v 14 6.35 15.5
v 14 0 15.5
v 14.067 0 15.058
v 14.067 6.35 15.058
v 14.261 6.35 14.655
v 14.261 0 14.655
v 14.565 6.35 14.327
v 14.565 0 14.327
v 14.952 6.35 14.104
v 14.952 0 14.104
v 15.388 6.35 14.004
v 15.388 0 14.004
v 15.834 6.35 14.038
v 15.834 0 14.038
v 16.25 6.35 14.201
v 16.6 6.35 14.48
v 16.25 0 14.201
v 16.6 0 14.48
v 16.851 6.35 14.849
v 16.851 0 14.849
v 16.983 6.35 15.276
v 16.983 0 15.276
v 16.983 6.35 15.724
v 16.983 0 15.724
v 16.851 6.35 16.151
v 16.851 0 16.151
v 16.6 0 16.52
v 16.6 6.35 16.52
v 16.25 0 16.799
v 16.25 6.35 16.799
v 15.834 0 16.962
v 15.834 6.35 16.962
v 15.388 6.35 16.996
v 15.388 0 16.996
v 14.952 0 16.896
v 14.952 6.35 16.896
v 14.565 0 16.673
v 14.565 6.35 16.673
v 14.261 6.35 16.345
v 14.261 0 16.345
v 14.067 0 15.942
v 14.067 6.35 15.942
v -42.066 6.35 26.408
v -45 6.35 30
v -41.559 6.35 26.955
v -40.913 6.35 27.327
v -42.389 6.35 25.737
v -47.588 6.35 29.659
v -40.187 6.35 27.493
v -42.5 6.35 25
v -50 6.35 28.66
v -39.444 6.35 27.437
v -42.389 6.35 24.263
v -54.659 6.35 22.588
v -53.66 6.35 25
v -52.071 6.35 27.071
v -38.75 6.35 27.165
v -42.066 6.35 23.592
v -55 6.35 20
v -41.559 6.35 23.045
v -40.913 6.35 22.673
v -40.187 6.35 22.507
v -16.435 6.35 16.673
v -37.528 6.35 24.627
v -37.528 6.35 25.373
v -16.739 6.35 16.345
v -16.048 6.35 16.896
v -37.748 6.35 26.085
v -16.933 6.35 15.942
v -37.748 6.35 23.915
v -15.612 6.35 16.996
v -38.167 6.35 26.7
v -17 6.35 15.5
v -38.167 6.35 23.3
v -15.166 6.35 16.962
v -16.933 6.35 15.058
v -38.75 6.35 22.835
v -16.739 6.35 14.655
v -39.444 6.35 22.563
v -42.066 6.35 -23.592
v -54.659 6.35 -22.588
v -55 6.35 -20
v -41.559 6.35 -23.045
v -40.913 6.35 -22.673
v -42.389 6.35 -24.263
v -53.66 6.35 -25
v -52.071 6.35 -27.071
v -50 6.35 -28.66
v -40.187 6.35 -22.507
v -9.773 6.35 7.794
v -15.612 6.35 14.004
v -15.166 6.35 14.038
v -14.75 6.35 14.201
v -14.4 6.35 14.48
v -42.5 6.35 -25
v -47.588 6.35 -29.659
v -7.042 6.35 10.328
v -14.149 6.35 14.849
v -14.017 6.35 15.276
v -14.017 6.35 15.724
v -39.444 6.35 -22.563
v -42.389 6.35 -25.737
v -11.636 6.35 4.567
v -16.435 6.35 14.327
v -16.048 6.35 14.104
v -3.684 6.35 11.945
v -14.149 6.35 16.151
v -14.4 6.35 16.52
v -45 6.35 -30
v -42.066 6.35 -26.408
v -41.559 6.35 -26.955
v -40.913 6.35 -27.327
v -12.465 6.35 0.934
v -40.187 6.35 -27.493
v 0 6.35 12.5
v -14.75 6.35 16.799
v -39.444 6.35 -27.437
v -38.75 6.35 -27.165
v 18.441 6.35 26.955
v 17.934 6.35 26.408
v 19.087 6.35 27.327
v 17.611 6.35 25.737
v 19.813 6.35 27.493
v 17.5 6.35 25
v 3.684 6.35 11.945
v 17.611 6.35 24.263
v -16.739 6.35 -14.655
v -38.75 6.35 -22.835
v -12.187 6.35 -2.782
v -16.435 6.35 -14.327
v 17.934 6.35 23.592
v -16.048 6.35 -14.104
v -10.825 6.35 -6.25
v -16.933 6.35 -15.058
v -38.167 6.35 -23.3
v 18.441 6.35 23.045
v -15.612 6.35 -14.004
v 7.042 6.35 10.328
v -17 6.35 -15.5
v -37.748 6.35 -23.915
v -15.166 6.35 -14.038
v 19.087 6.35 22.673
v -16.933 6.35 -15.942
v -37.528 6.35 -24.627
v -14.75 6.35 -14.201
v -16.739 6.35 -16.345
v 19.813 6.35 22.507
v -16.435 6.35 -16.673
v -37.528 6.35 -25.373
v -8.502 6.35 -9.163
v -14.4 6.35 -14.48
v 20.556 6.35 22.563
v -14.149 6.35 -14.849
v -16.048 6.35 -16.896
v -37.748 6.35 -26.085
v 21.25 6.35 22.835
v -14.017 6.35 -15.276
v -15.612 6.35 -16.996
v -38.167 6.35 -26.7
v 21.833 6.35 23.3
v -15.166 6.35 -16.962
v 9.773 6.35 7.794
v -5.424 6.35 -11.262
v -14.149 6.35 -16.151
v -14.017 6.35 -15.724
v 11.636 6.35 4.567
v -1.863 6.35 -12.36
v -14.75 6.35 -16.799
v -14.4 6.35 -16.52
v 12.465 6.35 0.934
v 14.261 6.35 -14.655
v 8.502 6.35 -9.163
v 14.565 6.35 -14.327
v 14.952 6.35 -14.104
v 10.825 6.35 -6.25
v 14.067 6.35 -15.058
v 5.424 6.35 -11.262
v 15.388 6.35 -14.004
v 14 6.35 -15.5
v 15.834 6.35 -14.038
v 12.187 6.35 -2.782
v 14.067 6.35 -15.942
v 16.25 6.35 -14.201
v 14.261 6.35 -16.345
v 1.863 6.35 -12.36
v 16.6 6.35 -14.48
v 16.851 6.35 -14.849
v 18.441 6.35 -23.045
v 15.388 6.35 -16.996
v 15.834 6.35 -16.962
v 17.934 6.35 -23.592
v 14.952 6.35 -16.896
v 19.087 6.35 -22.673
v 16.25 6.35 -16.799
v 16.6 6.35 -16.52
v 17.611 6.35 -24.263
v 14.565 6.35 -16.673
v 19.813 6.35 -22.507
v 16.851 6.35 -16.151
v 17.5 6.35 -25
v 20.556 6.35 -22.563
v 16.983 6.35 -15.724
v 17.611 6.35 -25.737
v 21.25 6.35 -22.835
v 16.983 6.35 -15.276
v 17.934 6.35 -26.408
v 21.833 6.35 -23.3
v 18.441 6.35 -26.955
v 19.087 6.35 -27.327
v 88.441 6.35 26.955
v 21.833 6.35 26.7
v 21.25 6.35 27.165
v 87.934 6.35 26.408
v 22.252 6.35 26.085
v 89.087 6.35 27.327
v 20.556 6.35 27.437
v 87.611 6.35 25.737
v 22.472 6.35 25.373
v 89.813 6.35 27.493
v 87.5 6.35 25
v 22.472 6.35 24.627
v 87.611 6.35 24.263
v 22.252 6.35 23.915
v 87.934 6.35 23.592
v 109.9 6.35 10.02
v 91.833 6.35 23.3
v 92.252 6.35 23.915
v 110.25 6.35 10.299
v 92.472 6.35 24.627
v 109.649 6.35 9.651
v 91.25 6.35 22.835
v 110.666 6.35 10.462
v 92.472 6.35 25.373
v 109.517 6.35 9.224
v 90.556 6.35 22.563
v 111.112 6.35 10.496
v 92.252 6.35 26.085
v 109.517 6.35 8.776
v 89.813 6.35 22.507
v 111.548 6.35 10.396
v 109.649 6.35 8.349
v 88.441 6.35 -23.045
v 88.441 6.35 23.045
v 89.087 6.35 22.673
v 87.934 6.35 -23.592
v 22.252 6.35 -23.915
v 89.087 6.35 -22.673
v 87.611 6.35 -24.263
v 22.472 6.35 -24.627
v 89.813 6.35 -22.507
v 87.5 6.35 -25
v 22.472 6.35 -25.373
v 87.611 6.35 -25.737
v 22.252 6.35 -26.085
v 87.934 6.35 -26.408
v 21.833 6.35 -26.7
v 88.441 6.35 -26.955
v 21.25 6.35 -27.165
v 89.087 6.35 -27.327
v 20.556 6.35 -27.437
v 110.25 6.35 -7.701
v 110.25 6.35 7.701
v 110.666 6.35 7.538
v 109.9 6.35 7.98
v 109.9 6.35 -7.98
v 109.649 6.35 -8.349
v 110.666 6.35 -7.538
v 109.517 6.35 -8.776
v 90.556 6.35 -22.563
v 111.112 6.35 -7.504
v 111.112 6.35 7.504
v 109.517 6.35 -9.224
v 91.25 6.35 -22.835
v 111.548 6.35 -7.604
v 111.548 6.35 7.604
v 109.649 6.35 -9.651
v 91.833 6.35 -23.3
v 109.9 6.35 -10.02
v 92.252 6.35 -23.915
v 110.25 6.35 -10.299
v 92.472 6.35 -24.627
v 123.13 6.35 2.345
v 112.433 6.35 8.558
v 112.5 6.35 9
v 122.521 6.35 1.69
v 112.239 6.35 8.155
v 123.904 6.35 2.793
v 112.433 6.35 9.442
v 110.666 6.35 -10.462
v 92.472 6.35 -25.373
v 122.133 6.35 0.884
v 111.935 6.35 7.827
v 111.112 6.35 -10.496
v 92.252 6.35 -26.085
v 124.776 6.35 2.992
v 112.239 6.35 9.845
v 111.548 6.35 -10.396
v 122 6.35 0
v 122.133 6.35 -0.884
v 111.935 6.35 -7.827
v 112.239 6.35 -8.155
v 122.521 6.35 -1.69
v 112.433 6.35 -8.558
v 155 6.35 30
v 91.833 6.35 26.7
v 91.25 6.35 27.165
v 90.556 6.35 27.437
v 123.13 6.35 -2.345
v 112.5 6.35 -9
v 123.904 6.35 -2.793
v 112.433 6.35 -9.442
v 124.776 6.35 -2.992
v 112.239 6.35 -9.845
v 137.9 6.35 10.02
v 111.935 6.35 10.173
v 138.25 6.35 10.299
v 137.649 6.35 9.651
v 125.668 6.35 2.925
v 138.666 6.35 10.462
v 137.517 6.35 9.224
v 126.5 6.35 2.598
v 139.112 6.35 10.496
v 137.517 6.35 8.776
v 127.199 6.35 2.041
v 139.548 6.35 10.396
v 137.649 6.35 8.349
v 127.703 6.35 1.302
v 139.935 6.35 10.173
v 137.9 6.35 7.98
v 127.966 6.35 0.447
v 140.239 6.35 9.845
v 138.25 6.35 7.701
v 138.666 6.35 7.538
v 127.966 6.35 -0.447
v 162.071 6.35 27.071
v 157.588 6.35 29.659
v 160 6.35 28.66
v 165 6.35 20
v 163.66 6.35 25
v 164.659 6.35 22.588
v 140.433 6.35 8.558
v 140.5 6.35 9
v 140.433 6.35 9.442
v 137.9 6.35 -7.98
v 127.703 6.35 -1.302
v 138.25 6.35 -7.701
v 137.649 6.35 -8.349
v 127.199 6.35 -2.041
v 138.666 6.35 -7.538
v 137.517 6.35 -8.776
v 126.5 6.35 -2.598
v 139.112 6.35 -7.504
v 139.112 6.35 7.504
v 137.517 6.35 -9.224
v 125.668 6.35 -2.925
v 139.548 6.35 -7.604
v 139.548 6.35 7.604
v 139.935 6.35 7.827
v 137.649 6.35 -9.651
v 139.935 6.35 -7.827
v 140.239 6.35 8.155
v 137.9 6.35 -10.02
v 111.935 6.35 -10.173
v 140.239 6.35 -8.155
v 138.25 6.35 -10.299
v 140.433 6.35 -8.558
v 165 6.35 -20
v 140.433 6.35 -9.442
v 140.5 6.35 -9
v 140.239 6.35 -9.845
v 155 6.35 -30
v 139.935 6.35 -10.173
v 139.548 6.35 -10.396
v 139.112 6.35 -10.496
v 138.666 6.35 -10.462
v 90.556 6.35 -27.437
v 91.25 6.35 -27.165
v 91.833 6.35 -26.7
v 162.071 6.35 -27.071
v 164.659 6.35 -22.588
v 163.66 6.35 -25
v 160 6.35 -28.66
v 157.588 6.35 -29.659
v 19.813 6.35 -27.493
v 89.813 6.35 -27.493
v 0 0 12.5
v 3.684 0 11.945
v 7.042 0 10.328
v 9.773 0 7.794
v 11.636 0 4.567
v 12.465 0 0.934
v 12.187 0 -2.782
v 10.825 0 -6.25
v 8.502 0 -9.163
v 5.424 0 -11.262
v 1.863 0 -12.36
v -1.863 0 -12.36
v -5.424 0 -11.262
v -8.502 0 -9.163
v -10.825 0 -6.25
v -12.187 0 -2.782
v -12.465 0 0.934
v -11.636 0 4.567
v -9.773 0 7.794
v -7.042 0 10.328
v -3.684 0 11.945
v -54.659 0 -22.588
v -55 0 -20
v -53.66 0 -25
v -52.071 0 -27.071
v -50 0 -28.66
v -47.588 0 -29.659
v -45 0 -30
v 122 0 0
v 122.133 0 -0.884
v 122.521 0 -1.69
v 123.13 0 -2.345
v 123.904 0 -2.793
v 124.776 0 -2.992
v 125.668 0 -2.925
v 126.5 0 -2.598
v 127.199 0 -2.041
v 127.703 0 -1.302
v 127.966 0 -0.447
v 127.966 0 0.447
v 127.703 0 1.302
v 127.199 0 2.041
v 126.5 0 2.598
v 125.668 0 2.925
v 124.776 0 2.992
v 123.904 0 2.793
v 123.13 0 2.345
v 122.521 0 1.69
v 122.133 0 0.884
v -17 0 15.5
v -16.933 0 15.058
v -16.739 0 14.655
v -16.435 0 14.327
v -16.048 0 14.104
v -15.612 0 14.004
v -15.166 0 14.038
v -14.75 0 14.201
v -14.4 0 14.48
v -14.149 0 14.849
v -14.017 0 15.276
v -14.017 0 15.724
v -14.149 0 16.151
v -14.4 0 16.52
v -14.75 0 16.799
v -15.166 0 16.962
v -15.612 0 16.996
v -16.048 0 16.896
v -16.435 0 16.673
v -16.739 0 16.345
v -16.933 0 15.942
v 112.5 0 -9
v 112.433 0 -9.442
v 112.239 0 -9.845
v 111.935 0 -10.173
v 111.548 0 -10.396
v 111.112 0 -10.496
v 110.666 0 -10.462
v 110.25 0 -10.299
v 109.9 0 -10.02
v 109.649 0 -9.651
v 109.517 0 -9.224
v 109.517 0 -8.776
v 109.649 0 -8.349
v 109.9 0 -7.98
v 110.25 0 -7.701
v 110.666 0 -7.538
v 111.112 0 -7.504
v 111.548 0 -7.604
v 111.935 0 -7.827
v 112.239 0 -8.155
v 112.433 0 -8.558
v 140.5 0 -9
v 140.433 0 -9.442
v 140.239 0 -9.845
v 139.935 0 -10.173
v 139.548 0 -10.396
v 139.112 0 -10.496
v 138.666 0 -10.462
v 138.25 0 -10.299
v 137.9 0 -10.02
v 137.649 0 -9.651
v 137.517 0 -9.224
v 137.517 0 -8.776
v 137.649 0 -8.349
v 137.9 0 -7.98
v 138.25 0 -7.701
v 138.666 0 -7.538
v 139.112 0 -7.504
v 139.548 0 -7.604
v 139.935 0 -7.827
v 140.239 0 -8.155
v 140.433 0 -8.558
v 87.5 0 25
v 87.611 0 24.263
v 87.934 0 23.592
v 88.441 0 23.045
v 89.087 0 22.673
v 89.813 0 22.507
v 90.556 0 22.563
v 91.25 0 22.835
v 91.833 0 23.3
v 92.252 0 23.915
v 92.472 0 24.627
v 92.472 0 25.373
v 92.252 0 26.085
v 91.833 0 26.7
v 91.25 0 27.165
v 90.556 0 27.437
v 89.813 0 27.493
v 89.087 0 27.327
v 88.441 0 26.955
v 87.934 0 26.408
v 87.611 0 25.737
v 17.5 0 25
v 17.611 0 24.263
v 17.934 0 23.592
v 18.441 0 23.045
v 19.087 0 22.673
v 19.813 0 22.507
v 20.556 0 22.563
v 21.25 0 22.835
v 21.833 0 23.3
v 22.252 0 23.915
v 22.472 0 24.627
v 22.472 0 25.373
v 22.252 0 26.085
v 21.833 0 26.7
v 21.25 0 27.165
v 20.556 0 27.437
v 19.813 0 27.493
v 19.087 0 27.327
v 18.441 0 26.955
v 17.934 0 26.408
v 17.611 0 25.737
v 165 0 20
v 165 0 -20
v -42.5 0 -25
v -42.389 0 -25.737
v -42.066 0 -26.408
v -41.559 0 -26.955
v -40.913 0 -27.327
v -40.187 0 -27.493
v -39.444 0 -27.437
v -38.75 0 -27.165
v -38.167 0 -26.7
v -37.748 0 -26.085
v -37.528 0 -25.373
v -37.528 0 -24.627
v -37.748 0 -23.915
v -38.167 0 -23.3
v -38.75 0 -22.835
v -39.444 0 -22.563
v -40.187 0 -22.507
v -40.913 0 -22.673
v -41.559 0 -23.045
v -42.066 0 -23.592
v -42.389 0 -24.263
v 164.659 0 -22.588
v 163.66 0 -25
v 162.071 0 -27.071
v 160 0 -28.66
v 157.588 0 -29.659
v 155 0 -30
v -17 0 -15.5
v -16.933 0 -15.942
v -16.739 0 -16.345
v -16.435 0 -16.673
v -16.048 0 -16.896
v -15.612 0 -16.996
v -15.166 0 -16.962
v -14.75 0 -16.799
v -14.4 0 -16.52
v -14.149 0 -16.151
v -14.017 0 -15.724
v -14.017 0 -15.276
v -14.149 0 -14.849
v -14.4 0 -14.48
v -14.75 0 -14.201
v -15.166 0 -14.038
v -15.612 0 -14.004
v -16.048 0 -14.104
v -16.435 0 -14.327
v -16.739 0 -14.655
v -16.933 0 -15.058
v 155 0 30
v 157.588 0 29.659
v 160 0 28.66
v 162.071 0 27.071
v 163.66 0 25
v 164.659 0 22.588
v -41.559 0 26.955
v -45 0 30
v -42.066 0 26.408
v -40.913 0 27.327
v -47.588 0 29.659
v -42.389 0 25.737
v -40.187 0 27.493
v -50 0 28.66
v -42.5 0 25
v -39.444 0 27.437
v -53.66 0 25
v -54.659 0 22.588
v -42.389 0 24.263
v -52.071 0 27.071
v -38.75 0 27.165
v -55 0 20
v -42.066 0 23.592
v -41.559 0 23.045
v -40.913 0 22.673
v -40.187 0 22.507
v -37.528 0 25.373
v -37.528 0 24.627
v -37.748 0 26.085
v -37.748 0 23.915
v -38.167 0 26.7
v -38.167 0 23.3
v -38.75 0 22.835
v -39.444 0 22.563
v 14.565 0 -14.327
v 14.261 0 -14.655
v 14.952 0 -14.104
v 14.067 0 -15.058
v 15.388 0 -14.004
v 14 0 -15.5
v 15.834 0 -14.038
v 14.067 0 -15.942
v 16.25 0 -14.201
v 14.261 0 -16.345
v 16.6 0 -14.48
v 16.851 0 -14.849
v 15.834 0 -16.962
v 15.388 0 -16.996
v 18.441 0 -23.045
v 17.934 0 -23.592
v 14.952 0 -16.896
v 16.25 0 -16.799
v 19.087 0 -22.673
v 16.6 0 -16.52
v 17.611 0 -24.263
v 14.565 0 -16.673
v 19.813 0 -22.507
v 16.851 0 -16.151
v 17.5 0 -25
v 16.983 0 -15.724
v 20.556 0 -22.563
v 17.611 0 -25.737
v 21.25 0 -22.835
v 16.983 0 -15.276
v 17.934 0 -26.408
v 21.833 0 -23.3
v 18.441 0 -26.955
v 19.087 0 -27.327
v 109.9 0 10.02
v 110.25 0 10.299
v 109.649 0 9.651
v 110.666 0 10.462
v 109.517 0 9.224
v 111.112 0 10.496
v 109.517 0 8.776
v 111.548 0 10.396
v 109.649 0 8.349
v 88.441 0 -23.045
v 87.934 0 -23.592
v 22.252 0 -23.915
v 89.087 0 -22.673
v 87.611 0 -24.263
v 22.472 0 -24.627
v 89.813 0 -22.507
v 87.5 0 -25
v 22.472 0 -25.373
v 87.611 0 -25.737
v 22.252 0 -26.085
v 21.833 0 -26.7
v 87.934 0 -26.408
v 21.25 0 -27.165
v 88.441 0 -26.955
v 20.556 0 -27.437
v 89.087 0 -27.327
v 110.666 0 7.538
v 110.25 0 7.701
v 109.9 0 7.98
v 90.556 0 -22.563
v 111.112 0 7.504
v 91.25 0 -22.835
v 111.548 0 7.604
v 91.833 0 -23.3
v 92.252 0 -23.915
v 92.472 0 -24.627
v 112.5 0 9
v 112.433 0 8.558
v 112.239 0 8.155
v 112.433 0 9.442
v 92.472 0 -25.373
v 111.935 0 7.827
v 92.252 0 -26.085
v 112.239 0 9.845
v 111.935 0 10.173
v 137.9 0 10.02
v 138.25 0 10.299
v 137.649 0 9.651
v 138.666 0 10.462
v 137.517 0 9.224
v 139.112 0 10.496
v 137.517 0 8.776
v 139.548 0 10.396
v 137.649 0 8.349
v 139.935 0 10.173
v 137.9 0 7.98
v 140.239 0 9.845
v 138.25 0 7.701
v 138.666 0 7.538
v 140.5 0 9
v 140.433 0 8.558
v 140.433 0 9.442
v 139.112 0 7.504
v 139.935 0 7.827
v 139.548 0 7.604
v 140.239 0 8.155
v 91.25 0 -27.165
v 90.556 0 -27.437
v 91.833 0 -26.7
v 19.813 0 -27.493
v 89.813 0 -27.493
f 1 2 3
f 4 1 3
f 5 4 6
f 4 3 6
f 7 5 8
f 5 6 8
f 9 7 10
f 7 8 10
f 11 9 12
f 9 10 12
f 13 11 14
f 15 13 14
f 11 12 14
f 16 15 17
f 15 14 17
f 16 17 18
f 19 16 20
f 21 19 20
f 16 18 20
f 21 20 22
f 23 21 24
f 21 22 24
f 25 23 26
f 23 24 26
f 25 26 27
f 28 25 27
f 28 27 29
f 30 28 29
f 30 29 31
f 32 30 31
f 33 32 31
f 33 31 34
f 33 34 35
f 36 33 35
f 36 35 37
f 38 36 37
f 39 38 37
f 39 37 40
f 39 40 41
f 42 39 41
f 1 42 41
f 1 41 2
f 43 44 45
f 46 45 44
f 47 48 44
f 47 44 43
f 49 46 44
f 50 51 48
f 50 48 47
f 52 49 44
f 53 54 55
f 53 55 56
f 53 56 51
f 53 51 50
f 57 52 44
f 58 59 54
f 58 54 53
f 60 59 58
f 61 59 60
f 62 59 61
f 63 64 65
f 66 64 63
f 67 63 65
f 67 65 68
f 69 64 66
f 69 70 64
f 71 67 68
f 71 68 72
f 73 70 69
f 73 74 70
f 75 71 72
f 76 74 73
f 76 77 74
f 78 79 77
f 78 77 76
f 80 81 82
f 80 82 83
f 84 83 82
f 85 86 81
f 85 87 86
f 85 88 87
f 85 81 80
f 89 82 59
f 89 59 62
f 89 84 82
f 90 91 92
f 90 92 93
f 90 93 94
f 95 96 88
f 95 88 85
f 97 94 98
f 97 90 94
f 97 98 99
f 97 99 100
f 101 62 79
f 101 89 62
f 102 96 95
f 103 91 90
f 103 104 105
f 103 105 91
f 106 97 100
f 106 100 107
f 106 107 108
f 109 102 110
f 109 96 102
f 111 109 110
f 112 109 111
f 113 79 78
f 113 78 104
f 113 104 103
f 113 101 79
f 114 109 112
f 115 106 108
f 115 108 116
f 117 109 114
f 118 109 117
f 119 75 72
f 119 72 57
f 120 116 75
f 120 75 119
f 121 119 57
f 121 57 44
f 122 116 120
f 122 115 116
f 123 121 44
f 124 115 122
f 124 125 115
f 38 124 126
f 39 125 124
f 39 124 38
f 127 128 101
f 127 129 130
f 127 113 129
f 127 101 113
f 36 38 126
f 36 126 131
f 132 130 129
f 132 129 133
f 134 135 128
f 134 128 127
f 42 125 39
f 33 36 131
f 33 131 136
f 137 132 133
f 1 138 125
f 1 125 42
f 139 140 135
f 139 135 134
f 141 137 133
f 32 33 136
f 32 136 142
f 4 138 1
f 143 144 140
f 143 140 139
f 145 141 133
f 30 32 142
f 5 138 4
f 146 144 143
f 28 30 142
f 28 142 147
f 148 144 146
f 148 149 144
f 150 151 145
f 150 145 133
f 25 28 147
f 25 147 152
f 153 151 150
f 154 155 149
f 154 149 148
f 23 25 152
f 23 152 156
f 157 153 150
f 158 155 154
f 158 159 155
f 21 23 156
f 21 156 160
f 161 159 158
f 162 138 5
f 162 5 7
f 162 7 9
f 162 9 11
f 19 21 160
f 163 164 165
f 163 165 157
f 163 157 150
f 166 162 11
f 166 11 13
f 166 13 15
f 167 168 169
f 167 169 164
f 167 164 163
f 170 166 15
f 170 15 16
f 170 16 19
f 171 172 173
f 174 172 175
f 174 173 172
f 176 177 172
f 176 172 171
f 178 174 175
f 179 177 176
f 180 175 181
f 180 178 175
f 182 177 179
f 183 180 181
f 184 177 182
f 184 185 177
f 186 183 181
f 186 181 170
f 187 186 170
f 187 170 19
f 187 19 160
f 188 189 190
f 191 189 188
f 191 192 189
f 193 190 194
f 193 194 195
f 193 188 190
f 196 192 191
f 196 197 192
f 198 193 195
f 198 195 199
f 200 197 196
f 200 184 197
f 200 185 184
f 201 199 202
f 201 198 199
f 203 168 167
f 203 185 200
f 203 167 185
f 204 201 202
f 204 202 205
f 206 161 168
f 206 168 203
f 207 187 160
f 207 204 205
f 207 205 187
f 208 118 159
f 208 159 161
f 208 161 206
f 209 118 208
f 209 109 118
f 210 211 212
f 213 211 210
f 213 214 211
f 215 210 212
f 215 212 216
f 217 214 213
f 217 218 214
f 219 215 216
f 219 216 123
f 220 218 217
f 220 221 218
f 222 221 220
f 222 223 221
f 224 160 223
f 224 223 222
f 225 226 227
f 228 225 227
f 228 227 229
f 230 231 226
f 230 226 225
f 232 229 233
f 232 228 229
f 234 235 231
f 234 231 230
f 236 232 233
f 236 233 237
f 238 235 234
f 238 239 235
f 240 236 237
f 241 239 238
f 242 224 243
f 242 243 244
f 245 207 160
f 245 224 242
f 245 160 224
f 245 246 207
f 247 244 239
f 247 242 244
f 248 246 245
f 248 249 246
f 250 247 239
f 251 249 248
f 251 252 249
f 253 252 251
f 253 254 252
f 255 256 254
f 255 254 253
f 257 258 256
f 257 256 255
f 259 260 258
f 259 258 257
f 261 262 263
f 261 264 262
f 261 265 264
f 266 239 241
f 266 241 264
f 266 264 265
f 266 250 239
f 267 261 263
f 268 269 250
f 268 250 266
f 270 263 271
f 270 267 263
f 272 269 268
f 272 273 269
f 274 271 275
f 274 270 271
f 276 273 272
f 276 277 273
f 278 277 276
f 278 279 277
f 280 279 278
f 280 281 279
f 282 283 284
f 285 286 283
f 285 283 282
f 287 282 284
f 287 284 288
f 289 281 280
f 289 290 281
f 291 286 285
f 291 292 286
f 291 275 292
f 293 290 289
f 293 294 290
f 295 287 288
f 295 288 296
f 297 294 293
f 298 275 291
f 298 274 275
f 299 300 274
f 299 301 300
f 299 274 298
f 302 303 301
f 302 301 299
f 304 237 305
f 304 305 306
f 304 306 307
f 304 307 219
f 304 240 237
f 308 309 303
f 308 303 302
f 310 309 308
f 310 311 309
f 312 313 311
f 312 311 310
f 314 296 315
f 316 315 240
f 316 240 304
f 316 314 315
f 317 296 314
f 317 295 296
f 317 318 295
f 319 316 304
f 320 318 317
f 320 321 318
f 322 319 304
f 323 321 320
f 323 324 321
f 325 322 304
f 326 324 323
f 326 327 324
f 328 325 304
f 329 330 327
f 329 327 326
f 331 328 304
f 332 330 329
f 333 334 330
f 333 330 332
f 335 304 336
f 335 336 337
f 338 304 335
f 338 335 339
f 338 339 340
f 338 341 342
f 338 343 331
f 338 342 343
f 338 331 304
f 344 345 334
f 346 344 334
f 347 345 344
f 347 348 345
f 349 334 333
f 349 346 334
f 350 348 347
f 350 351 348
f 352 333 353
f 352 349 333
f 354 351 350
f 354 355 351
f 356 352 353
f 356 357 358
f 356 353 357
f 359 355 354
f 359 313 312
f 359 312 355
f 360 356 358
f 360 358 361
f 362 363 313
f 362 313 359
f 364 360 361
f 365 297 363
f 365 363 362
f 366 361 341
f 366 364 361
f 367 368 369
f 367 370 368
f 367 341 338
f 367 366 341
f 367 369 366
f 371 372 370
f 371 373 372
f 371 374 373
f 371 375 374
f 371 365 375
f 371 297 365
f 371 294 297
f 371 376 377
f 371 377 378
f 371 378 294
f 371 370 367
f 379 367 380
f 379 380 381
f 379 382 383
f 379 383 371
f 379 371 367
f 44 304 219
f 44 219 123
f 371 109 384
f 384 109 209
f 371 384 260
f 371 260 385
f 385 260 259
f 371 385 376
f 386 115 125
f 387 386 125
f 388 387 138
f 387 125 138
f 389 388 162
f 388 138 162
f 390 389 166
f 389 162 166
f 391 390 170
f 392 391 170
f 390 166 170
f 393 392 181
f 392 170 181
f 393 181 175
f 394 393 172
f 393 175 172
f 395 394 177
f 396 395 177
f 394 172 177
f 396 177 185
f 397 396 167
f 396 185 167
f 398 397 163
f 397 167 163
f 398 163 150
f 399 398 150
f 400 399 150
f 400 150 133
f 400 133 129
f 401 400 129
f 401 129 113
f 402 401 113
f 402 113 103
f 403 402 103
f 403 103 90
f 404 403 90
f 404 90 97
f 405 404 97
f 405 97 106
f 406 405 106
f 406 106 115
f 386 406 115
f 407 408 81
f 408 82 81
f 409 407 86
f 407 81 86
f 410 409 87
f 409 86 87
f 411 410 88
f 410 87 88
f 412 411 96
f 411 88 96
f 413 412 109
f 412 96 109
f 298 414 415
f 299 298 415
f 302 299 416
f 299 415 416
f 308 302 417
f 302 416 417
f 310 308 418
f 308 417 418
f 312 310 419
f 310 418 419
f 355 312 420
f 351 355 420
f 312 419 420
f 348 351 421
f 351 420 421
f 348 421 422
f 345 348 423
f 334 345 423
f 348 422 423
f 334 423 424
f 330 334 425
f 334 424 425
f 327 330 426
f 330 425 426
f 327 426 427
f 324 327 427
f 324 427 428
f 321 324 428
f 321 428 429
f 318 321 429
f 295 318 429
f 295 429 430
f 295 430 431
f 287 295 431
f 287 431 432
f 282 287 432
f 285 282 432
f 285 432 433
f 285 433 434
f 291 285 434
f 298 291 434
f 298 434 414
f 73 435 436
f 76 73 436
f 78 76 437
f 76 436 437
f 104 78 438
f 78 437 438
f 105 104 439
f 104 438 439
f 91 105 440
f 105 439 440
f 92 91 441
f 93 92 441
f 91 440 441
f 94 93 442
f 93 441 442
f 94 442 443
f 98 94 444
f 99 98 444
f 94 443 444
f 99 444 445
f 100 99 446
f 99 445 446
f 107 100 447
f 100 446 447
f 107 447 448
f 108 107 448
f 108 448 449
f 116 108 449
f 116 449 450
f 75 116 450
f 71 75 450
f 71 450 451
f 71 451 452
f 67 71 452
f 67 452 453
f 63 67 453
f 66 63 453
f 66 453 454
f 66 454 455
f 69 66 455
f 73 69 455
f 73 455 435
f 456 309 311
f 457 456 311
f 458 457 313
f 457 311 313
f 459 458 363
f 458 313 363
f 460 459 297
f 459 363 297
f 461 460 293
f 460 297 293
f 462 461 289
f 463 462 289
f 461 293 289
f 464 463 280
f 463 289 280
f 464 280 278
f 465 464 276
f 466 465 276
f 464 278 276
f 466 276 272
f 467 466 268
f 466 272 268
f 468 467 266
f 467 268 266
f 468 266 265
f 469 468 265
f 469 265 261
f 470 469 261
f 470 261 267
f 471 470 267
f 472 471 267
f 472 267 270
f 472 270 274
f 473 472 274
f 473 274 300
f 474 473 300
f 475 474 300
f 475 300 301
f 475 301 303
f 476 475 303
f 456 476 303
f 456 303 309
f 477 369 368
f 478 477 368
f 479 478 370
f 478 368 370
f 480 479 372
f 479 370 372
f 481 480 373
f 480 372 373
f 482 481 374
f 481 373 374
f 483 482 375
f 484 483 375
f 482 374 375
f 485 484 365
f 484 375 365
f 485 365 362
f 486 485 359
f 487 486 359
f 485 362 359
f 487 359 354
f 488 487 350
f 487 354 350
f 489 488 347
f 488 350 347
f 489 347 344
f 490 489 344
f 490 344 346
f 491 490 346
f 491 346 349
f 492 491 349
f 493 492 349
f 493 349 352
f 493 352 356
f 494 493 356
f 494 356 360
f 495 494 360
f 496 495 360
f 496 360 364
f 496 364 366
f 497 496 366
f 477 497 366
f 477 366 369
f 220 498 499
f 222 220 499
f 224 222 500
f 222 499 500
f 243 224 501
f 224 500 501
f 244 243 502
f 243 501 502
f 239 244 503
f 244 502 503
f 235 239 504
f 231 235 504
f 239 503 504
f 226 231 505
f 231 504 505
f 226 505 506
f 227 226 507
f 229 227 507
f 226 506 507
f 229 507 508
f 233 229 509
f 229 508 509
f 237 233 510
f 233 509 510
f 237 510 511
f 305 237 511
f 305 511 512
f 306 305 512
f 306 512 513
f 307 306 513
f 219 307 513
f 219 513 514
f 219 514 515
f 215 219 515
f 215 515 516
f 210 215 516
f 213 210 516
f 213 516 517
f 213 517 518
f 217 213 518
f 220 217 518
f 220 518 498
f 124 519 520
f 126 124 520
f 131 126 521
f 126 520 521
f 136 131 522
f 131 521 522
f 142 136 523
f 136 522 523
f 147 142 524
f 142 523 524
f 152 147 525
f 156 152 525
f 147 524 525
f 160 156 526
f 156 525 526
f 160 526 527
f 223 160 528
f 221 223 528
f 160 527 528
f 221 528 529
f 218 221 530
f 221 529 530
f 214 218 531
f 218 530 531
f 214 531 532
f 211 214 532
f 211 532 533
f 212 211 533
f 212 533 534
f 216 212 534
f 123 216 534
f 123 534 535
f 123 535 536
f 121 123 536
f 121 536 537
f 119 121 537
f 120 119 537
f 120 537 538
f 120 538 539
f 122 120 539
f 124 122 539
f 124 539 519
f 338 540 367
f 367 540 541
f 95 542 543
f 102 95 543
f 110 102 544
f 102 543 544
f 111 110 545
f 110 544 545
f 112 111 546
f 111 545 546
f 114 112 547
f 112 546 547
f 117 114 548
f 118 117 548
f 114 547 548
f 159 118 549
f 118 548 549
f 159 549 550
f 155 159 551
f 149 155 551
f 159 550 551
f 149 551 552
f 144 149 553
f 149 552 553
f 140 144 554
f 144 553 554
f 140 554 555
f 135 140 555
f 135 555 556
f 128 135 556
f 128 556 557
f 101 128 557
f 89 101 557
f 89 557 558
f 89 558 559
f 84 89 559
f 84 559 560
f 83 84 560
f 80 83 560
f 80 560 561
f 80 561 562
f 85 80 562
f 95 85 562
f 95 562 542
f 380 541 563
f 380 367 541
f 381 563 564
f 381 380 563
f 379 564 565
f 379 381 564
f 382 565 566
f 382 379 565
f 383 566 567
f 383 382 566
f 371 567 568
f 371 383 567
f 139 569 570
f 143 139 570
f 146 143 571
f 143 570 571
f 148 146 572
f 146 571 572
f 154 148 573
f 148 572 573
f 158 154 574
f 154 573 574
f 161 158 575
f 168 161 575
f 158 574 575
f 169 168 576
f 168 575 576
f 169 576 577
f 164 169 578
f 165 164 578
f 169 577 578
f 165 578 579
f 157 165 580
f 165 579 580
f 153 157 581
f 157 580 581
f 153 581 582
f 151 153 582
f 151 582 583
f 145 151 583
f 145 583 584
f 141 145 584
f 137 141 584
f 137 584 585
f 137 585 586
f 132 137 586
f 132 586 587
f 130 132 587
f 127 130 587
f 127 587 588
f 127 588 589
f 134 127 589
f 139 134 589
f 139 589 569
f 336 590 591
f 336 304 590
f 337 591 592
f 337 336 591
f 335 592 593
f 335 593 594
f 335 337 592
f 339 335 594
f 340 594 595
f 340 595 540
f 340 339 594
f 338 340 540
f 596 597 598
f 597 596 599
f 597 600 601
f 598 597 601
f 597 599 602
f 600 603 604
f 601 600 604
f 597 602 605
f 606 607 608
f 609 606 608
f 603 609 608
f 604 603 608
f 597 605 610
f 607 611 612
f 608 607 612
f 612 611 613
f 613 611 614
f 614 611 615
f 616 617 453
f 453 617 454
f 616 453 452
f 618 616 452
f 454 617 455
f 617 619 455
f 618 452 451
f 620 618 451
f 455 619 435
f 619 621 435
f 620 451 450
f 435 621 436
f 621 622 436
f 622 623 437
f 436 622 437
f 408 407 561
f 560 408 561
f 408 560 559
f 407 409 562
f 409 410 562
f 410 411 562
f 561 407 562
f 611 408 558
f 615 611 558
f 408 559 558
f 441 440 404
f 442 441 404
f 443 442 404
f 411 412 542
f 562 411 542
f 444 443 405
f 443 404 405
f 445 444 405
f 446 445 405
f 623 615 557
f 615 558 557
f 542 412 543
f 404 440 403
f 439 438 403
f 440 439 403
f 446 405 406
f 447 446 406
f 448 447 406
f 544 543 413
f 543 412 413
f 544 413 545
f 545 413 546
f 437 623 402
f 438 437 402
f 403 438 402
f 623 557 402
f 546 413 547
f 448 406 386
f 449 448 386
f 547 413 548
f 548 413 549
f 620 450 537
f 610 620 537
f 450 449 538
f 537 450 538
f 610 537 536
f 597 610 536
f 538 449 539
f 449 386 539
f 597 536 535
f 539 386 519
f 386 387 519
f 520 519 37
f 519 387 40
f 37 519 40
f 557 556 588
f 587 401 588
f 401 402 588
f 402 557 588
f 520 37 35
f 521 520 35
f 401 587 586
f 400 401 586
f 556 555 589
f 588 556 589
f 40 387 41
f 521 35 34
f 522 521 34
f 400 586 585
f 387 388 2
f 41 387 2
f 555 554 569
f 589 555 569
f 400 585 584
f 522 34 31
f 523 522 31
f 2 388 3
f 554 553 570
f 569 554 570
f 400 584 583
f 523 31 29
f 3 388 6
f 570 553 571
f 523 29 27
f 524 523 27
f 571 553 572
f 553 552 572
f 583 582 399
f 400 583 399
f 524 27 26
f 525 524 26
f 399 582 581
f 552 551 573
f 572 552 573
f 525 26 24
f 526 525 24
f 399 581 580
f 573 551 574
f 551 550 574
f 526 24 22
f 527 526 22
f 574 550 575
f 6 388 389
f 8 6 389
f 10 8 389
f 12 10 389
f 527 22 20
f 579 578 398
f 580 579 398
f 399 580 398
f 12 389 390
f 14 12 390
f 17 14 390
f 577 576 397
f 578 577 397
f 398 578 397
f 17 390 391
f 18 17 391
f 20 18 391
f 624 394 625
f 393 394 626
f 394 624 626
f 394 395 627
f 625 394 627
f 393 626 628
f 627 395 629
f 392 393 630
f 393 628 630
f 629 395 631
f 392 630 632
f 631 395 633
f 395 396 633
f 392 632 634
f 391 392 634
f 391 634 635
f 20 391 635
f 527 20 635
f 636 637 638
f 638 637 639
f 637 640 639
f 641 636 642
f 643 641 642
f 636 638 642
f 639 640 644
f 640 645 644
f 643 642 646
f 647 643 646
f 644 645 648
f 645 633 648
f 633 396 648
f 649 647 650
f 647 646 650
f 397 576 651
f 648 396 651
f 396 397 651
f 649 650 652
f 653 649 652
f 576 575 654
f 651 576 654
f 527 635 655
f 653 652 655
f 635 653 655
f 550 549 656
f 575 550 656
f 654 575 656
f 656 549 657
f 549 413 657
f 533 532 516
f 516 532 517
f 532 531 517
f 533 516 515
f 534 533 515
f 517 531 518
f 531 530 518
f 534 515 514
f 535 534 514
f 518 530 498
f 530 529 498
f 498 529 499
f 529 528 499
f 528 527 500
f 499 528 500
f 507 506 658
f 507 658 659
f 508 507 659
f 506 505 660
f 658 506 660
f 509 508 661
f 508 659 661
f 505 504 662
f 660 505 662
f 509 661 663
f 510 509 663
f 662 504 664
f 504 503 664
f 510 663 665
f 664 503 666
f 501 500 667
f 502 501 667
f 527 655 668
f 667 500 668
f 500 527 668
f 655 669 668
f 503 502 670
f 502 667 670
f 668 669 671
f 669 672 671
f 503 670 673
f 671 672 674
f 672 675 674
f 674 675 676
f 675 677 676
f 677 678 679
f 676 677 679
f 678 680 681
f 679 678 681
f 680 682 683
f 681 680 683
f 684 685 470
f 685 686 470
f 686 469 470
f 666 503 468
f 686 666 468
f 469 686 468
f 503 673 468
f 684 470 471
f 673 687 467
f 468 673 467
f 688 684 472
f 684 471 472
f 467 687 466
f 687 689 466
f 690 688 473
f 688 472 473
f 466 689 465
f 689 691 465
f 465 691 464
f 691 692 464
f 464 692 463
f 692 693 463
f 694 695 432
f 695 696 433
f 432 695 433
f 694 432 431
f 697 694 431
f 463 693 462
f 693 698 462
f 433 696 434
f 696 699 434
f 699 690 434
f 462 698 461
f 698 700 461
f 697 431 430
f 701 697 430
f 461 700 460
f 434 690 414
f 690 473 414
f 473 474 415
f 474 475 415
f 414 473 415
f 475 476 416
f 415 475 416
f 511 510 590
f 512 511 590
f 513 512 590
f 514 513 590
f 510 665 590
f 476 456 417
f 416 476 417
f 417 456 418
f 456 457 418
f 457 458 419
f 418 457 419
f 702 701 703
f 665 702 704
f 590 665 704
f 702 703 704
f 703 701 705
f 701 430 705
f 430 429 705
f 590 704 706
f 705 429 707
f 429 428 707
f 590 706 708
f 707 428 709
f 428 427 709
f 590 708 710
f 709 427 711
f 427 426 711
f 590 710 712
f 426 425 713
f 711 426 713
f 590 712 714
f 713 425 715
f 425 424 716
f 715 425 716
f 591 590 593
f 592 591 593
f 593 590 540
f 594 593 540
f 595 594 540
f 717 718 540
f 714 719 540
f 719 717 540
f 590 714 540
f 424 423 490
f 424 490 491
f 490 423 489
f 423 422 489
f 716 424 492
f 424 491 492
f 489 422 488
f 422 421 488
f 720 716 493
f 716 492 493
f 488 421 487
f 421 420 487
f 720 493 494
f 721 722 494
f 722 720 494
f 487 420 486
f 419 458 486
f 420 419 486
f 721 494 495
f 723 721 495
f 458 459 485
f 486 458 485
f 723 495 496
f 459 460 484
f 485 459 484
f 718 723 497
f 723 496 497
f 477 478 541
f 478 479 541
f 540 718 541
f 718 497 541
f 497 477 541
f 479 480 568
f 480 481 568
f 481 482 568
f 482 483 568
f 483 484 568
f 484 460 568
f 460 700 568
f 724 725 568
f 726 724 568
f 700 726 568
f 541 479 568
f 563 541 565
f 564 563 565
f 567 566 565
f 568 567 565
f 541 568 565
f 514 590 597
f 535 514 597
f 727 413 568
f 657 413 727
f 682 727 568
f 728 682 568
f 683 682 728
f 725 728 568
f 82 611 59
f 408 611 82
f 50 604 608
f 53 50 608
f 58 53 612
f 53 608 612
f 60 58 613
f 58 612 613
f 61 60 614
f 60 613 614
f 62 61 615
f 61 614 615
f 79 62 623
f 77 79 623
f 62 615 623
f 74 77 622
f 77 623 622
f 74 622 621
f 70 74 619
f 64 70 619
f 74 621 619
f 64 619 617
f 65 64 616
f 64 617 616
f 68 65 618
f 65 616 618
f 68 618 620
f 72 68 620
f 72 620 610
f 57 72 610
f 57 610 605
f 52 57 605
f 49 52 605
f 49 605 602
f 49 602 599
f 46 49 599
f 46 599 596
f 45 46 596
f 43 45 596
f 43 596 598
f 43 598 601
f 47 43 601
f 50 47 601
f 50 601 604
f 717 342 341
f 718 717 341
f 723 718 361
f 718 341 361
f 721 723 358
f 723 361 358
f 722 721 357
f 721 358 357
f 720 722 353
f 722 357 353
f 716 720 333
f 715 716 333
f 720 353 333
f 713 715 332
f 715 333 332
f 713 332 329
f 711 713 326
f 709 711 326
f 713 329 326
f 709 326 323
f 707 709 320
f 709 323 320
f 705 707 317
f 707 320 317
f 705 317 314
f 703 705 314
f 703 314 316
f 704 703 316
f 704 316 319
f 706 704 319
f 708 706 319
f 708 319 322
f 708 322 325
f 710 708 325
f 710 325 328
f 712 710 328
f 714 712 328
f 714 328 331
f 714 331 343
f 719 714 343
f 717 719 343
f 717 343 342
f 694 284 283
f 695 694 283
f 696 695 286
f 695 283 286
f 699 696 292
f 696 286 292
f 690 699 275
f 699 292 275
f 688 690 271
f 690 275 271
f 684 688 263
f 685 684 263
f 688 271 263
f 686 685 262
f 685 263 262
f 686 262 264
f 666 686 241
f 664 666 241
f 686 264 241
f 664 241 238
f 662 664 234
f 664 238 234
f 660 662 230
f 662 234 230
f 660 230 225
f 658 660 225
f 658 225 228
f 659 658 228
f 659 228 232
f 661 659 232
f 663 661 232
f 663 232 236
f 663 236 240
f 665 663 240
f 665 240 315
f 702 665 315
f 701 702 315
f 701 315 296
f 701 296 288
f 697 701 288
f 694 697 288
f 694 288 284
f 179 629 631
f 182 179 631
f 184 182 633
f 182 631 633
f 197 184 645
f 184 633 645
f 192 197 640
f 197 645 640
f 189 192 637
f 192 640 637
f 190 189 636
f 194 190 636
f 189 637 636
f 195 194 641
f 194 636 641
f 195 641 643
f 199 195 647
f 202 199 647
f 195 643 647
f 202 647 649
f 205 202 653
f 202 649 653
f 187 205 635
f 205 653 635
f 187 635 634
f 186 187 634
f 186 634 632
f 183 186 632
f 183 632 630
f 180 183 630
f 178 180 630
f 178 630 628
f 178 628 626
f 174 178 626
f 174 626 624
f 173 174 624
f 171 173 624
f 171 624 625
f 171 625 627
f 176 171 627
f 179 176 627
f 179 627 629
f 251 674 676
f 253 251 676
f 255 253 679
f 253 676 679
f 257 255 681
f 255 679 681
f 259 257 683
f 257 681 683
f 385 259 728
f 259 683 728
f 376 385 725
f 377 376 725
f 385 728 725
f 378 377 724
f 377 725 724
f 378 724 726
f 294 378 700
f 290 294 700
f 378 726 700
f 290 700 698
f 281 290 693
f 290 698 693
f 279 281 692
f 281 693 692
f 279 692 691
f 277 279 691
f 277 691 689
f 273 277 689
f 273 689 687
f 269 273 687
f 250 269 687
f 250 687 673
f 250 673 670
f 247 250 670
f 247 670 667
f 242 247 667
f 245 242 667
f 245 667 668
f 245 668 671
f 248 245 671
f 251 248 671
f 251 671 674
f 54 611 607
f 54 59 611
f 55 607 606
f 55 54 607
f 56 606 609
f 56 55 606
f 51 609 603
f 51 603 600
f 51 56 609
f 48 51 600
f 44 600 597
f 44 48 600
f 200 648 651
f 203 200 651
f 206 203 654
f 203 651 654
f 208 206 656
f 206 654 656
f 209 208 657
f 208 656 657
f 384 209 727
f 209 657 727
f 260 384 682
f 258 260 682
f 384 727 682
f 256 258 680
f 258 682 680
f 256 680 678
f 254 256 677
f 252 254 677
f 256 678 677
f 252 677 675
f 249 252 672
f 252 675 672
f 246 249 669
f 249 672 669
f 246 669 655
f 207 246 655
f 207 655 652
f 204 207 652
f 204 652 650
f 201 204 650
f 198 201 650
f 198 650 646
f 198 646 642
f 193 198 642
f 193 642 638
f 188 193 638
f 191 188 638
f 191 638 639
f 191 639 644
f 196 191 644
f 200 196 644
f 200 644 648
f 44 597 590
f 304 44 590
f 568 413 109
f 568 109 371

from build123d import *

# Parameters (mm, degrees)
SKETCH1_W             = 220
SKETCH1_H             = 60
BOSS_EXTRUDE1_DEPTH   = 6.35
FILLET1_R             = 10
F_3_0MM_DOWEL_HOLE1_D = 3
SKETCH6_R             = 12.5
CUT_EXTRUDE1_DEPTH    = 168.825273722
F_6_0MM_DOWEL_HOLE1_D = 6
F_3_0MM_DOWEL_HOLE2_D = 3
F_5_0MM_DOWEL_HOLE1_D = 5


with BuildPart() as part:
    # Sketch1 → Boss-Extrude1 (new body)
    with BuildSketch(Plane(origin=(0, 0, 0), x_dir=(1, 0, 0), z_dir=(0, 1, 0))):
        with Locations((55, 0)):
            Rectangle(SKETCH1_W, SKETCH1_H)
    extrude(amount=BOSS_EXTRUDE1_DEPTH)

    # Fillet1
    fillet1_edges = [part.edges().sort_by_distance(p)[0] for p in [
        (-55, 3.175, -30),
        (165, 3.175, -30),
        (165, 3.175, 30),
        (-55, 3.175, 30),
    ]]
    fillet(fillet1_edges, radius=FILLET1_R)

    # Ø3.0mm Dowel Hole1 (through all)
    with Locations(Plane(origin=(0, 6.35, 0), x_dir=(1, 0, 0), z_dir=(0, 1, 0))):
        with Locations((-15.5, 15.5), (15.5, 15.5), (15.5, -15.5), (-15.5, -15.5)):
            Hole(F_3_0MM_DOWEL_HOLE1_D / 2)

    # Sketch6 → Cut-Extrude1 (cut, through all)
    with BuildSketch(Plane(origin=(0, 6.35, 0), x_dir=(1, 0, 0), z_dir=(0, 1, 0))):
        with Locations(Location((0, 0, 0), (0, 0, 270))):
            Circle(SKETCH6_R)
    extrude(amount=-CUT_EXTRUDE1_DEPTH, mode=Mode.SUBTRACT)

    # Ø6.0mm Dowel Hole1 (through all)
    with Locations(Plane(origin=(0, 6.35, 0), x_dir=(1, 0, 0), z_dir=(0, 1, 0))):
        with Locations((125, 0)):
            Hole(F_6_0MM_DOWEL_HOLE1_D / 2)

    # Ø3.0mm Dowel Hole2 (through all)
    with Locations(Plane(origin=(0, 0, 0), x_dir=(-1, 0, 0), z_dir=(0, -1, 0))):
        with Locations((-139, 9), (-111, 9), (-111, -9), (-139, -9)):
            Hole(F_3_0MM_DOWEL_HOLE2_D / 2)

    # Ø5.0mm Dowel Hole1 (through all)
    with Locations(Plane(origin=(0, 6.35, 0), x_dir=(1, 0, 0), z_dir=(0, 1, 0))):
        with Locations((20, -25), (90, -25), (90, 25), (20, 25), (-40, -25), (-40, 25)):
            Hole(F_5_0MM_DOWEL_HOLE1_D / 2)


solid = part.part
